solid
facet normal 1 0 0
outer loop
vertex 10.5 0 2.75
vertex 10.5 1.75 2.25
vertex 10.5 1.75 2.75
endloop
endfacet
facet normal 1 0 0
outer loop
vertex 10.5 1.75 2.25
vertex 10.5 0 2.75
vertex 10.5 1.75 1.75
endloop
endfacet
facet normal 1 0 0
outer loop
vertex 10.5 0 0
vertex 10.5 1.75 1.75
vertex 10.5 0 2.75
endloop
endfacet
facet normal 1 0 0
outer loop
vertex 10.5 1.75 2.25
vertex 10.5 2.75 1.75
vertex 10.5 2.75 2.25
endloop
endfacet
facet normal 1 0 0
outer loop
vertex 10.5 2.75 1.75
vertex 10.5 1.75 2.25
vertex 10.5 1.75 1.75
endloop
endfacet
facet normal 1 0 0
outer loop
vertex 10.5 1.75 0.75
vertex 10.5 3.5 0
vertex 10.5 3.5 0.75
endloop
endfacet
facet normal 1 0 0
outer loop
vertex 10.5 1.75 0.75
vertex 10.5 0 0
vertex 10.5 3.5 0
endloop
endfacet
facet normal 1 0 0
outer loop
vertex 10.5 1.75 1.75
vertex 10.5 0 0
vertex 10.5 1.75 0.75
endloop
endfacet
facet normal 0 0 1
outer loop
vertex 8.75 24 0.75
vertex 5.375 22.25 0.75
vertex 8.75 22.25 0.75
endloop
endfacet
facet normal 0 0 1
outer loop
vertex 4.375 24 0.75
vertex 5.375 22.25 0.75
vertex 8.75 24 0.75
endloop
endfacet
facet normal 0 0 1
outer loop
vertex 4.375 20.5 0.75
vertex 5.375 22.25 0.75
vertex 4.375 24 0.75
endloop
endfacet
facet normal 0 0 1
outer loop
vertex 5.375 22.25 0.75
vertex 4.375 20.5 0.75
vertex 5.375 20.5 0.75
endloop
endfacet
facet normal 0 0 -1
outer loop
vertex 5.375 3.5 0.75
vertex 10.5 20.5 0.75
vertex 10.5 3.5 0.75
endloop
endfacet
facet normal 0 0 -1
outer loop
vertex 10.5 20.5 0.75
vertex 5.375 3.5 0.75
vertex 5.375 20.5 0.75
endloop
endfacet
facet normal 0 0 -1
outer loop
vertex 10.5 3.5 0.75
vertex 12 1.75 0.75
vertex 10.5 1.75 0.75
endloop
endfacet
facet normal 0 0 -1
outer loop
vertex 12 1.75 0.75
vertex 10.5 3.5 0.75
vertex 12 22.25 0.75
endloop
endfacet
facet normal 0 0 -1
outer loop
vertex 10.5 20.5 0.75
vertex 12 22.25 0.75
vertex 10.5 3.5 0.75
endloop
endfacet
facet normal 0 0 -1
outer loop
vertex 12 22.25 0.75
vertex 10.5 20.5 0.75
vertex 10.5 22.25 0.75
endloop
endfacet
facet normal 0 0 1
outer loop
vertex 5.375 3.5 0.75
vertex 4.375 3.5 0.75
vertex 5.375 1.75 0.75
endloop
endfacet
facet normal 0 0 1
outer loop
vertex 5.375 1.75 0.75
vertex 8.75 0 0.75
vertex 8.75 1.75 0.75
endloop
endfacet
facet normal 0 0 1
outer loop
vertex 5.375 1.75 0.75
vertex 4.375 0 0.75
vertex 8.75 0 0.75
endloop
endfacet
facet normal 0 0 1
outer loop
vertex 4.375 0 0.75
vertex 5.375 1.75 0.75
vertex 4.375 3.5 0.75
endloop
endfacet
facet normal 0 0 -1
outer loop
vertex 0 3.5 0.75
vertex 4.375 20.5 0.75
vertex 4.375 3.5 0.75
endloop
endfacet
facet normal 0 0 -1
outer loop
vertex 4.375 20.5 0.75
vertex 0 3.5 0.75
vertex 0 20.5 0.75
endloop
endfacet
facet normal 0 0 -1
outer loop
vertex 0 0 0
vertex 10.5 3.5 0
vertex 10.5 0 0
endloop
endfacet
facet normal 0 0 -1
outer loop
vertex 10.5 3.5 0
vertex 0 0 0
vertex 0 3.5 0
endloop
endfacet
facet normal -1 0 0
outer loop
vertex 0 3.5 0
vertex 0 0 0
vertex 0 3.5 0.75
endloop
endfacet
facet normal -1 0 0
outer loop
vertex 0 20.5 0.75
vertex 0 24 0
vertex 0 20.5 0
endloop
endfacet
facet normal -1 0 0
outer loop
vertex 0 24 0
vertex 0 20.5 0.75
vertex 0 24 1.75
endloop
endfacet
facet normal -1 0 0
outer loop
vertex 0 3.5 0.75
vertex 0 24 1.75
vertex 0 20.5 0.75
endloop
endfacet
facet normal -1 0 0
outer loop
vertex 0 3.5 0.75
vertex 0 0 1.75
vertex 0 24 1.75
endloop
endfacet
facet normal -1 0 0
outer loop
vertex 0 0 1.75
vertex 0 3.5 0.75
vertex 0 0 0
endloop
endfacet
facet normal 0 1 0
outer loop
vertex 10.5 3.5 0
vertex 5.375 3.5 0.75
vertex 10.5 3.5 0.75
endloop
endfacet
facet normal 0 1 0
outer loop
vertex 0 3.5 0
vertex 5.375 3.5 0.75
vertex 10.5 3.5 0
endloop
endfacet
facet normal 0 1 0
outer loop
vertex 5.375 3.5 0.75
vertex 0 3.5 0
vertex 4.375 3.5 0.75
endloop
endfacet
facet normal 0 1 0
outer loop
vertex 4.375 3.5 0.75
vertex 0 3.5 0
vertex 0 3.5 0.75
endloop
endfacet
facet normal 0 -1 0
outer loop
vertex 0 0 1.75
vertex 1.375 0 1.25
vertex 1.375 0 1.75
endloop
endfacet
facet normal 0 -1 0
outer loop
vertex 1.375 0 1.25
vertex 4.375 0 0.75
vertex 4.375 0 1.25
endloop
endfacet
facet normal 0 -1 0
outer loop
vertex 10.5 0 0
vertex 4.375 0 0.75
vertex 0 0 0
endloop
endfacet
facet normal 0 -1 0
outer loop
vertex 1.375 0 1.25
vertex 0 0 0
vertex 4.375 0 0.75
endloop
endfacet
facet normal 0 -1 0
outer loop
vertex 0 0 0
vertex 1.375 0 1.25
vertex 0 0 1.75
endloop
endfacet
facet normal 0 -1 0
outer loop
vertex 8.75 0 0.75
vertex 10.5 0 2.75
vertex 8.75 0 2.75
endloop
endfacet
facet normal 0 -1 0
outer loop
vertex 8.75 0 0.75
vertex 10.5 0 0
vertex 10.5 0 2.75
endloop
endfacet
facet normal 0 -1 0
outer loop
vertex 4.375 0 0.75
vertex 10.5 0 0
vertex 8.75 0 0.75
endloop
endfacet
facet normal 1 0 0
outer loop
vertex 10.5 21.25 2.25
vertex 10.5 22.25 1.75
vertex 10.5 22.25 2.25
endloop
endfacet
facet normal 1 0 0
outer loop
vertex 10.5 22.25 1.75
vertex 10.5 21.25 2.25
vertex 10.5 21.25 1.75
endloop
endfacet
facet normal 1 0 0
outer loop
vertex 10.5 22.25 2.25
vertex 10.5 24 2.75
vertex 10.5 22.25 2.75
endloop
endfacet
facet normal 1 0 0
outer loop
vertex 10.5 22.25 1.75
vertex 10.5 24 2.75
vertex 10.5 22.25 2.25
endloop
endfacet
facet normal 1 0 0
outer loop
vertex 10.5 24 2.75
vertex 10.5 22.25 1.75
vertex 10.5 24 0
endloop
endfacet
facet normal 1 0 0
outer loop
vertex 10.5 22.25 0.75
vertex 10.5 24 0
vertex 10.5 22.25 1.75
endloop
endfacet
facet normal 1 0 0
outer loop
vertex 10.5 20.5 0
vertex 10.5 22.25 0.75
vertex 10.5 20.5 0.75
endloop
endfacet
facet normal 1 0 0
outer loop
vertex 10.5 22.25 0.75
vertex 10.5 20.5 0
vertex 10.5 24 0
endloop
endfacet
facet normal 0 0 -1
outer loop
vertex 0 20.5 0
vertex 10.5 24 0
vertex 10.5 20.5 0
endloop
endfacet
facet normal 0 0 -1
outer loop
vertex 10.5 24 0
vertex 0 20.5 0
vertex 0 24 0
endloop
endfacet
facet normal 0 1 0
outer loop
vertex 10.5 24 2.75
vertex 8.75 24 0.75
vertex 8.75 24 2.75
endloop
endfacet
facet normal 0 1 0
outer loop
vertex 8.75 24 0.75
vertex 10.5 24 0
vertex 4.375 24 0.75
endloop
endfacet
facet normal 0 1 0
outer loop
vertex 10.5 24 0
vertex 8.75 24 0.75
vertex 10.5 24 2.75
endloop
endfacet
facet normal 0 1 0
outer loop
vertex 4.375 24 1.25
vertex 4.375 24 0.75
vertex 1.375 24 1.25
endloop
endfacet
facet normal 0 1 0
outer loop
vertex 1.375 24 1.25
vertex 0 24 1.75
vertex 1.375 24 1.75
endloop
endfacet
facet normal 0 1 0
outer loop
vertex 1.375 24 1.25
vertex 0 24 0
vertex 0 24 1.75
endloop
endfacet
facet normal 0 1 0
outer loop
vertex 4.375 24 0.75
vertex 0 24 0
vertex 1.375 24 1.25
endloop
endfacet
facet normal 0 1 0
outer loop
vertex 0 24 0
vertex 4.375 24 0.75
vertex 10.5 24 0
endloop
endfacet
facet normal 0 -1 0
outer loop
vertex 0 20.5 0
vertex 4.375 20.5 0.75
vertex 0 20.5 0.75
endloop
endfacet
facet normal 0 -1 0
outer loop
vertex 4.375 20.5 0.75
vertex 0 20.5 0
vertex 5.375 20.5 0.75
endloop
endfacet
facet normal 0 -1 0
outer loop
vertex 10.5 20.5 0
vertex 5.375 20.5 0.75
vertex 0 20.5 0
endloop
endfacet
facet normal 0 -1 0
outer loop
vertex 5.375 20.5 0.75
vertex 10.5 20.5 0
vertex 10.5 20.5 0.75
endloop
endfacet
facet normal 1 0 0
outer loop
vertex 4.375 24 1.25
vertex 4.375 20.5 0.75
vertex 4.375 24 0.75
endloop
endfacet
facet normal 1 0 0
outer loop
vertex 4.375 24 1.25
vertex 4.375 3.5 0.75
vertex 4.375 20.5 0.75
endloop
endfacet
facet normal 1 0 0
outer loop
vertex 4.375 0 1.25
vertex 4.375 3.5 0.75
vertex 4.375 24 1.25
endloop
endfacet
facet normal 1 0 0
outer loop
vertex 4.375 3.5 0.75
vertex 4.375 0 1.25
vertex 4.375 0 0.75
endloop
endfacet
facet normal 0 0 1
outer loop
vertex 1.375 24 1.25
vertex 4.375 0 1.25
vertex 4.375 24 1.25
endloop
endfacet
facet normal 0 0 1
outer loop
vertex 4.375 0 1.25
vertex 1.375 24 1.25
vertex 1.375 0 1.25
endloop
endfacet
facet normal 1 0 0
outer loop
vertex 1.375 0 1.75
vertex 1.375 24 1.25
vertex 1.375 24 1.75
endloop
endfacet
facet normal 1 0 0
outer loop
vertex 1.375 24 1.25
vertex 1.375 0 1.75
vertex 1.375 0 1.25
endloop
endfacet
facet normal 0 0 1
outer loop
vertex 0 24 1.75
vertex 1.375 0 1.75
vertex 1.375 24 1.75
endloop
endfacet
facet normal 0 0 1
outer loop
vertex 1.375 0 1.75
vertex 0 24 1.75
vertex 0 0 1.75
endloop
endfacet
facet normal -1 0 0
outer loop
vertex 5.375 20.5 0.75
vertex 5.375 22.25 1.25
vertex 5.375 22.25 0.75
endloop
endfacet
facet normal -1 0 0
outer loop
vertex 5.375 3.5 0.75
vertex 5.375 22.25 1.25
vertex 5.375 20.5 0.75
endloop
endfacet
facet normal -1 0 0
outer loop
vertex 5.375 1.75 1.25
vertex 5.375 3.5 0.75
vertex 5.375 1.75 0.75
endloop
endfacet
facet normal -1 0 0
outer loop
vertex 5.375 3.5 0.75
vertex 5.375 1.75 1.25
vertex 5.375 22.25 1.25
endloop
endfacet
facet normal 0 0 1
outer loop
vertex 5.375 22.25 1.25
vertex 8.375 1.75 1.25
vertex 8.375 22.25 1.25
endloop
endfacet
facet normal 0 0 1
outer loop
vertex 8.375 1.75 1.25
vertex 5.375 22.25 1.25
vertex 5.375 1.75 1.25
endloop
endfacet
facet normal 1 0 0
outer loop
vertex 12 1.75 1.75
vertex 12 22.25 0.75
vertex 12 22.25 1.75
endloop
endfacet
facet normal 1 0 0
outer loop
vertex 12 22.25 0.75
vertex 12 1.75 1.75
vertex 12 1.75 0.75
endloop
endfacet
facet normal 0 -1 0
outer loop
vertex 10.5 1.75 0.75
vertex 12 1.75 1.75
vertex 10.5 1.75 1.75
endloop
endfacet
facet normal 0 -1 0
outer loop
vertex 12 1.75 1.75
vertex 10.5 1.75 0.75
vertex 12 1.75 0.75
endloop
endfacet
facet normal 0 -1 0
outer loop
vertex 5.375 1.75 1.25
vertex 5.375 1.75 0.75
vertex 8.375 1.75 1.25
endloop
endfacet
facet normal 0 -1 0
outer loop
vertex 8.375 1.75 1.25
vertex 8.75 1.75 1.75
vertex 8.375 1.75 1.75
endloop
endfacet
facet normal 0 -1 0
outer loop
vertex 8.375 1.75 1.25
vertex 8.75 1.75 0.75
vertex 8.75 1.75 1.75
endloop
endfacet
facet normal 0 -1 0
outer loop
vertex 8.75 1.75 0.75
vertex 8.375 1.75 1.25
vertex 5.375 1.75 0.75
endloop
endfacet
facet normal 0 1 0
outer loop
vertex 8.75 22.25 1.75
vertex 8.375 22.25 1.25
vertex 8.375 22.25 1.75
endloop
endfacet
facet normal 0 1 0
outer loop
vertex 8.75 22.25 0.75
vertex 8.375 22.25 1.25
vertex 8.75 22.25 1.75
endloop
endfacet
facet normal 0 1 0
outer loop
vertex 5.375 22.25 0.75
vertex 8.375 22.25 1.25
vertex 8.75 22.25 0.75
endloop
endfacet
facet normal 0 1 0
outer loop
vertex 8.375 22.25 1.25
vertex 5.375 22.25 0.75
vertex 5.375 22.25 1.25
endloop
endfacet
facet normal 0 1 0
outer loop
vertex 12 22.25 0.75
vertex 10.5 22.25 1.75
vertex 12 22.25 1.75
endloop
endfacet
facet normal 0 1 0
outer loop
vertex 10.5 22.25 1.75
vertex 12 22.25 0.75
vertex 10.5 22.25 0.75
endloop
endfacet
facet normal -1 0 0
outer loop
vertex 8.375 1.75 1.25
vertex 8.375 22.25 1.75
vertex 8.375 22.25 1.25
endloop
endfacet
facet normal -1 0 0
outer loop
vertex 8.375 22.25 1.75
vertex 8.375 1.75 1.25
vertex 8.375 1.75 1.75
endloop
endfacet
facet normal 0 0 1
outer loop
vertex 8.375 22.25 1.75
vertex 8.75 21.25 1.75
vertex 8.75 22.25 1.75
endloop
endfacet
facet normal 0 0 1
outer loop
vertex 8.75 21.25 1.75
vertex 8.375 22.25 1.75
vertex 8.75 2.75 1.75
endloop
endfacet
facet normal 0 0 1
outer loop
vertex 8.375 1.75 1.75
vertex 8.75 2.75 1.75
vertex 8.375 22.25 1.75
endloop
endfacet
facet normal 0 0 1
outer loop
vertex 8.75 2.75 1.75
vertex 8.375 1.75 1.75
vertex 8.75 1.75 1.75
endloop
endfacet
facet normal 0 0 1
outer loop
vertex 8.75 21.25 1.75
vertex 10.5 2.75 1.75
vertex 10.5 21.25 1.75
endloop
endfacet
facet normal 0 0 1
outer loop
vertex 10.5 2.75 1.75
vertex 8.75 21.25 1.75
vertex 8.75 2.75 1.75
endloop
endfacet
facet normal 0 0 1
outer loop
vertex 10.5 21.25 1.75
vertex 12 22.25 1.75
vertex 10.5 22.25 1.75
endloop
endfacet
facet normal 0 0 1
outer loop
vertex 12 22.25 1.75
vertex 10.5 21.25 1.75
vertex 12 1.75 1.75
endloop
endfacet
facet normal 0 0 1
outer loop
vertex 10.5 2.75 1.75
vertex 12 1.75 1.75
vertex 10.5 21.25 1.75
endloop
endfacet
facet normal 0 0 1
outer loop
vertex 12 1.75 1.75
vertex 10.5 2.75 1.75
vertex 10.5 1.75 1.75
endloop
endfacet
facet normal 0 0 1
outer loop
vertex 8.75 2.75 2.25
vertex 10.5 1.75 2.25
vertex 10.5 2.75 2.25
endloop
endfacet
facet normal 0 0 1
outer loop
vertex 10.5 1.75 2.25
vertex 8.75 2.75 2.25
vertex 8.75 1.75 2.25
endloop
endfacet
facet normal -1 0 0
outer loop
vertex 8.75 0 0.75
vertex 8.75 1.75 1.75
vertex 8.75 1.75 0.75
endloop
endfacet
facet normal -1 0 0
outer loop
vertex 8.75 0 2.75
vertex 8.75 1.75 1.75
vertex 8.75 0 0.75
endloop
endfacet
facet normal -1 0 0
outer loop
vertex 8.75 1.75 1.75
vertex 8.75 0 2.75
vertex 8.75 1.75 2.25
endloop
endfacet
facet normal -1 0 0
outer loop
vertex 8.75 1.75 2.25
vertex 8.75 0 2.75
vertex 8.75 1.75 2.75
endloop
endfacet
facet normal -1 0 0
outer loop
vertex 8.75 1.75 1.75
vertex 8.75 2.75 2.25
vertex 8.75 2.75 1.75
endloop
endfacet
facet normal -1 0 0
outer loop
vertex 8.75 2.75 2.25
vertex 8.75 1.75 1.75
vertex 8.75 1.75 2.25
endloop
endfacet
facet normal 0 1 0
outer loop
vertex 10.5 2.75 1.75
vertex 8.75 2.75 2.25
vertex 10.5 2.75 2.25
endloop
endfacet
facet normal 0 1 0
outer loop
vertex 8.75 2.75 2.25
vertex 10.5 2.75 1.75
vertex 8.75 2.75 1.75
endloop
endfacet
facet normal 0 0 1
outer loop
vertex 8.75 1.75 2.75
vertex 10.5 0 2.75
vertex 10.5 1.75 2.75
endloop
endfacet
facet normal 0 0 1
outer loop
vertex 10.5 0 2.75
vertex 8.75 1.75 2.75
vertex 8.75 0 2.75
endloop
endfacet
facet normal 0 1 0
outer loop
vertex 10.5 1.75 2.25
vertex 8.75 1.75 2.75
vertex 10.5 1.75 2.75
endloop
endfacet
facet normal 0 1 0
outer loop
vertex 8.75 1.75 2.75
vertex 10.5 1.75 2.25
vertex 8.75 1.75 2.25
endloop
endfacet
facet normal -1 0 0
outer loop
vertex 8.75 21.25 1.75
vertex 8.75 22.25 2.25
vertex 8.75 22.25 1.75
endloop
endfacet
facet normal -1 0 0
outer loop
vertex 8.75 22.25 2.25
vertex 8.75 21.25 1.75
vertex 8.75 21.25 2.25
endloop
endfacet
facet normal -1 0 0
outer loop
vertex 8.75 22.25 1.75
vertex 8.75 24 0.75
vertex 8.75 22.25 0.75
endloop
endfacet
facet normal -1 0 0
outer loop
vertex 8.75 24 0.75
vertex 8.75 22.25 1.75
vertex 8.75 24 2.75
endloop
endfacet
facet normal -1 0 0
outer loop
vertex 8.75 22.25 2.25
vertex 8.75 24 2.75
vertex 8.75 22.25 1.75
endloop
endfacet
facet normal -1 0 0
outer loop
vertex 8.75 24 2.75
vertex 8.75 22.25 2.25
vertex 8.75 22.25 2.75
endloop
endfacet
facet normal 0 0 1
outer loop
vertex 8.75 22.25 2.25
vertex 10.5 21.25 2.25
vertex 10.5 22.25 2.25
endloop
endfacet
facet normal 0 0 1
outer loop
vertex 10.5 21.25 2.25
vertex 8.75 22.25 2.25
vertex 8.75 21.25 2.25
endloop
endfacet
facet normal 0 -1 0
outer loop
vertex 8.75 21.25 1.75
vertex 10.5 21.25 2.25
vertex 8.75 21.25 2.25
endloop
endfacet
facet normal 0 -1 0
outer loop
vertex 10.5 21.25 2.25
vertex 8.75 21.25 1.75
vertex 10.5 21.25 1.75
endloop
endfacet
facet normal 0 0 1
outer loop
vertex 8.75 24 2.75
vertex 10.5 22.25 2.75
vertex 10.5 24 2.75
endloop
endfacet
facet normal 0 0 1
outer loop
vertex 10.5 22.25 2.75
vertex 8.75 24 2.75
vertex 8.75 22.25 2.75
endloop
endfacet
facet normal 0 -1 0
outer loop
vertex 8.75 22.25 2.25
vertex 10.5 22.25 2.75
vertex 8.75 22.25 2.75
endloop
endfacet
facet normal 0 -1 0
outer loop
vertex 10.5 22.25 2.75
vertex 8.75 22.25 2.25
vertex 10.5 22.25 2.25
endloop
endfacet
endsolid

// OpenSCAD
// file: hold-down-pad-part.scad
use <defs.scad>;

module hold_down_pad_part() {
  color(light_purple()) {
    cube([hold_down_spacer_length(), hold_down_pad_length(), piece_thickness()]);
  }
}
// file: hold-down-spacer-part.scad
use <defs.scad>;

module hold_down_spacer_part() {
  color(dark_yellow()) {
    cube([hold_down_spacer_length(), hold_down_spacer_length(), piece_thickness()]);
  }
}
// file: right-fence-part.scad
use <defs.scad>;

module right_fence_part() {
  color(brown()) {
    cube([right_fence_width(),right_fence_length(),piece_thickness()]);
  }
}
// file: right-base-part.scad
use <defs.scad>;

module right_base_part() {
  color(light_blue()) {
    cube([right_base_width(),right_fence_length(),piece_thickness()]);
  }
}
// file: right-angle-part.scad
use <defs.scad>;

module right_angle_part() {
  color(pink()) {
    cube([right_angle_length(),right_angle_width(),right_angle_thickness()]);
  }
}
// file: left-fence-part.scad
use <defs.scad>;

module left_fence_part() {
  color(green()) {
    cube([left_fence_width(),left_fence_length(),piece_thickness()]);
  }
}
// file: left-base-part.scad
use <defs.scad>;

module left_base_part() {
  color(light_yellow()) {
    cube([left_base_width(),left_fence_length(),piece_thickness()]);
  }
}
// file: hold-down-sub.scad
use <defs.scad>;
use <hold-down-spacer-part.scad>;
use <hold-down-pad-part.scad>;

module hold_down_sub() {
  hold_down_spacer_part();
  translate([0, 0, piece_thickness()]) {
    hold_down_spacer_part();
    translate([0, 0, piece_thickness()]) {
      hold_down_pad_part();
      translate([0, 0, piece_thickness()]) {
        hold_down_spacer_part();
      }
    }
  }
}
// file: right-fence-sub.scad
use <defs.scad>;
use <right-base-part.scad>;
use <right-fence-part.scad>;

module right_fence_sub() {
  right_base_part();
  translate([0, 0, piece_thickness()]) {
    right_fence_part();
  }
}
// file: right-angle-sub.scad
use <defs.scad>;
use <right-angle-part.scad>;

module right_angle_sub() {
  right_angle_part();
  translate([0, (left_fence_length() - right_angle_width()), 0]) {
    right_angle_part();
  }
}
// file: left-fence-sub.scad
use <defs.scad>;
use <left-base-part.scad>
use <left-fence-part.scad>

module left_fence_sub() {
  left_base_part();
  translate([0, 0, piece_thickness()]) {
    left_fence_part();
  }
}
// file: defs.scad
function inch(val=1) = val*1;

function piece_thickness() = inch(0.5);
function right_angle_thickness() = inch(0.75);
function saw_kerf() = inch(0.03);

function left_fence_length() = inch(24);
function left_fence_width() = inch(1.0 + (3.0/8.0));
function left_base_width() = inch(4.0 + (3.0/8.0));

function right_angle_width() = inch(3.5);
function right_angle_length() = inch(10.5);

function right_fence_length() = inch(20.5);
function right_fence_width() = inch(3.0 + (5.0/8.0));
function right_base_width() = inch(6.0 + (5.0/8.0));

function hold_down_spacer_length() = inch(1 + (3/4));
function hold_down_pad_length() = inch(2 + (3/4));

// green #95CB69 [0.58,0.80,0.41]
function green() = [0.58,0.80,0.41];

//light yellow #FCF8B9 [0.99,0.97,0.73]
function light_yellow() = [0.99,0.97,0.73];

//dark yellow #F8EE41 [0.97,0.93,0.25]
function dark_yellow() = [0.97,0.93,0.25];

//light blue #95D7E3 [0.58,0.84,0.89]
function light_blue() = [0.58,0.84,0.89];

//light purple #B9B5DA [0.73,0.71,0.85]
function light_purple() = [0.73,0.71,0.85];

//brown #F4AA61 [0.96,0.67,0.38]
function brown() = [0.96,0.67,0.38];

//pink #F7B5B7 [0.97,0.71,0.72]
function pink() = [0.97,0.71,0.72];
// main file
use <defs.scad>;
use <left-fence-sub.scad>;
use <right-angle-sub.scad>;
use <right-fence-sub.scad>;
use <hold-down-sub.scad>;

right_angle_sub();

translate([0, 0, right_angle_thickness()]) {
  left_fence_sub();
}

translate([(right_base_width() + left_base_width() + inch(1)), 0, 0]) {
  translate([0, (right_fence_length() + ((left_fence_length() - right_fence_length())/2)), right_angle_thickness()]) {
    rotate([0, 0, 180]) {
      right_fence_sub();
    }
  }
}

translate([(right_angle_length() - hold_down_spacer_length()), 0, right_angle_thickness()]) {
  hold_down_sub();
}
translate([right_angle_length(), left_fence_length(), right_angle_thickness()]) {
  rotate([0, 0, 180]) {
    hold_down_sub();
  }
}
